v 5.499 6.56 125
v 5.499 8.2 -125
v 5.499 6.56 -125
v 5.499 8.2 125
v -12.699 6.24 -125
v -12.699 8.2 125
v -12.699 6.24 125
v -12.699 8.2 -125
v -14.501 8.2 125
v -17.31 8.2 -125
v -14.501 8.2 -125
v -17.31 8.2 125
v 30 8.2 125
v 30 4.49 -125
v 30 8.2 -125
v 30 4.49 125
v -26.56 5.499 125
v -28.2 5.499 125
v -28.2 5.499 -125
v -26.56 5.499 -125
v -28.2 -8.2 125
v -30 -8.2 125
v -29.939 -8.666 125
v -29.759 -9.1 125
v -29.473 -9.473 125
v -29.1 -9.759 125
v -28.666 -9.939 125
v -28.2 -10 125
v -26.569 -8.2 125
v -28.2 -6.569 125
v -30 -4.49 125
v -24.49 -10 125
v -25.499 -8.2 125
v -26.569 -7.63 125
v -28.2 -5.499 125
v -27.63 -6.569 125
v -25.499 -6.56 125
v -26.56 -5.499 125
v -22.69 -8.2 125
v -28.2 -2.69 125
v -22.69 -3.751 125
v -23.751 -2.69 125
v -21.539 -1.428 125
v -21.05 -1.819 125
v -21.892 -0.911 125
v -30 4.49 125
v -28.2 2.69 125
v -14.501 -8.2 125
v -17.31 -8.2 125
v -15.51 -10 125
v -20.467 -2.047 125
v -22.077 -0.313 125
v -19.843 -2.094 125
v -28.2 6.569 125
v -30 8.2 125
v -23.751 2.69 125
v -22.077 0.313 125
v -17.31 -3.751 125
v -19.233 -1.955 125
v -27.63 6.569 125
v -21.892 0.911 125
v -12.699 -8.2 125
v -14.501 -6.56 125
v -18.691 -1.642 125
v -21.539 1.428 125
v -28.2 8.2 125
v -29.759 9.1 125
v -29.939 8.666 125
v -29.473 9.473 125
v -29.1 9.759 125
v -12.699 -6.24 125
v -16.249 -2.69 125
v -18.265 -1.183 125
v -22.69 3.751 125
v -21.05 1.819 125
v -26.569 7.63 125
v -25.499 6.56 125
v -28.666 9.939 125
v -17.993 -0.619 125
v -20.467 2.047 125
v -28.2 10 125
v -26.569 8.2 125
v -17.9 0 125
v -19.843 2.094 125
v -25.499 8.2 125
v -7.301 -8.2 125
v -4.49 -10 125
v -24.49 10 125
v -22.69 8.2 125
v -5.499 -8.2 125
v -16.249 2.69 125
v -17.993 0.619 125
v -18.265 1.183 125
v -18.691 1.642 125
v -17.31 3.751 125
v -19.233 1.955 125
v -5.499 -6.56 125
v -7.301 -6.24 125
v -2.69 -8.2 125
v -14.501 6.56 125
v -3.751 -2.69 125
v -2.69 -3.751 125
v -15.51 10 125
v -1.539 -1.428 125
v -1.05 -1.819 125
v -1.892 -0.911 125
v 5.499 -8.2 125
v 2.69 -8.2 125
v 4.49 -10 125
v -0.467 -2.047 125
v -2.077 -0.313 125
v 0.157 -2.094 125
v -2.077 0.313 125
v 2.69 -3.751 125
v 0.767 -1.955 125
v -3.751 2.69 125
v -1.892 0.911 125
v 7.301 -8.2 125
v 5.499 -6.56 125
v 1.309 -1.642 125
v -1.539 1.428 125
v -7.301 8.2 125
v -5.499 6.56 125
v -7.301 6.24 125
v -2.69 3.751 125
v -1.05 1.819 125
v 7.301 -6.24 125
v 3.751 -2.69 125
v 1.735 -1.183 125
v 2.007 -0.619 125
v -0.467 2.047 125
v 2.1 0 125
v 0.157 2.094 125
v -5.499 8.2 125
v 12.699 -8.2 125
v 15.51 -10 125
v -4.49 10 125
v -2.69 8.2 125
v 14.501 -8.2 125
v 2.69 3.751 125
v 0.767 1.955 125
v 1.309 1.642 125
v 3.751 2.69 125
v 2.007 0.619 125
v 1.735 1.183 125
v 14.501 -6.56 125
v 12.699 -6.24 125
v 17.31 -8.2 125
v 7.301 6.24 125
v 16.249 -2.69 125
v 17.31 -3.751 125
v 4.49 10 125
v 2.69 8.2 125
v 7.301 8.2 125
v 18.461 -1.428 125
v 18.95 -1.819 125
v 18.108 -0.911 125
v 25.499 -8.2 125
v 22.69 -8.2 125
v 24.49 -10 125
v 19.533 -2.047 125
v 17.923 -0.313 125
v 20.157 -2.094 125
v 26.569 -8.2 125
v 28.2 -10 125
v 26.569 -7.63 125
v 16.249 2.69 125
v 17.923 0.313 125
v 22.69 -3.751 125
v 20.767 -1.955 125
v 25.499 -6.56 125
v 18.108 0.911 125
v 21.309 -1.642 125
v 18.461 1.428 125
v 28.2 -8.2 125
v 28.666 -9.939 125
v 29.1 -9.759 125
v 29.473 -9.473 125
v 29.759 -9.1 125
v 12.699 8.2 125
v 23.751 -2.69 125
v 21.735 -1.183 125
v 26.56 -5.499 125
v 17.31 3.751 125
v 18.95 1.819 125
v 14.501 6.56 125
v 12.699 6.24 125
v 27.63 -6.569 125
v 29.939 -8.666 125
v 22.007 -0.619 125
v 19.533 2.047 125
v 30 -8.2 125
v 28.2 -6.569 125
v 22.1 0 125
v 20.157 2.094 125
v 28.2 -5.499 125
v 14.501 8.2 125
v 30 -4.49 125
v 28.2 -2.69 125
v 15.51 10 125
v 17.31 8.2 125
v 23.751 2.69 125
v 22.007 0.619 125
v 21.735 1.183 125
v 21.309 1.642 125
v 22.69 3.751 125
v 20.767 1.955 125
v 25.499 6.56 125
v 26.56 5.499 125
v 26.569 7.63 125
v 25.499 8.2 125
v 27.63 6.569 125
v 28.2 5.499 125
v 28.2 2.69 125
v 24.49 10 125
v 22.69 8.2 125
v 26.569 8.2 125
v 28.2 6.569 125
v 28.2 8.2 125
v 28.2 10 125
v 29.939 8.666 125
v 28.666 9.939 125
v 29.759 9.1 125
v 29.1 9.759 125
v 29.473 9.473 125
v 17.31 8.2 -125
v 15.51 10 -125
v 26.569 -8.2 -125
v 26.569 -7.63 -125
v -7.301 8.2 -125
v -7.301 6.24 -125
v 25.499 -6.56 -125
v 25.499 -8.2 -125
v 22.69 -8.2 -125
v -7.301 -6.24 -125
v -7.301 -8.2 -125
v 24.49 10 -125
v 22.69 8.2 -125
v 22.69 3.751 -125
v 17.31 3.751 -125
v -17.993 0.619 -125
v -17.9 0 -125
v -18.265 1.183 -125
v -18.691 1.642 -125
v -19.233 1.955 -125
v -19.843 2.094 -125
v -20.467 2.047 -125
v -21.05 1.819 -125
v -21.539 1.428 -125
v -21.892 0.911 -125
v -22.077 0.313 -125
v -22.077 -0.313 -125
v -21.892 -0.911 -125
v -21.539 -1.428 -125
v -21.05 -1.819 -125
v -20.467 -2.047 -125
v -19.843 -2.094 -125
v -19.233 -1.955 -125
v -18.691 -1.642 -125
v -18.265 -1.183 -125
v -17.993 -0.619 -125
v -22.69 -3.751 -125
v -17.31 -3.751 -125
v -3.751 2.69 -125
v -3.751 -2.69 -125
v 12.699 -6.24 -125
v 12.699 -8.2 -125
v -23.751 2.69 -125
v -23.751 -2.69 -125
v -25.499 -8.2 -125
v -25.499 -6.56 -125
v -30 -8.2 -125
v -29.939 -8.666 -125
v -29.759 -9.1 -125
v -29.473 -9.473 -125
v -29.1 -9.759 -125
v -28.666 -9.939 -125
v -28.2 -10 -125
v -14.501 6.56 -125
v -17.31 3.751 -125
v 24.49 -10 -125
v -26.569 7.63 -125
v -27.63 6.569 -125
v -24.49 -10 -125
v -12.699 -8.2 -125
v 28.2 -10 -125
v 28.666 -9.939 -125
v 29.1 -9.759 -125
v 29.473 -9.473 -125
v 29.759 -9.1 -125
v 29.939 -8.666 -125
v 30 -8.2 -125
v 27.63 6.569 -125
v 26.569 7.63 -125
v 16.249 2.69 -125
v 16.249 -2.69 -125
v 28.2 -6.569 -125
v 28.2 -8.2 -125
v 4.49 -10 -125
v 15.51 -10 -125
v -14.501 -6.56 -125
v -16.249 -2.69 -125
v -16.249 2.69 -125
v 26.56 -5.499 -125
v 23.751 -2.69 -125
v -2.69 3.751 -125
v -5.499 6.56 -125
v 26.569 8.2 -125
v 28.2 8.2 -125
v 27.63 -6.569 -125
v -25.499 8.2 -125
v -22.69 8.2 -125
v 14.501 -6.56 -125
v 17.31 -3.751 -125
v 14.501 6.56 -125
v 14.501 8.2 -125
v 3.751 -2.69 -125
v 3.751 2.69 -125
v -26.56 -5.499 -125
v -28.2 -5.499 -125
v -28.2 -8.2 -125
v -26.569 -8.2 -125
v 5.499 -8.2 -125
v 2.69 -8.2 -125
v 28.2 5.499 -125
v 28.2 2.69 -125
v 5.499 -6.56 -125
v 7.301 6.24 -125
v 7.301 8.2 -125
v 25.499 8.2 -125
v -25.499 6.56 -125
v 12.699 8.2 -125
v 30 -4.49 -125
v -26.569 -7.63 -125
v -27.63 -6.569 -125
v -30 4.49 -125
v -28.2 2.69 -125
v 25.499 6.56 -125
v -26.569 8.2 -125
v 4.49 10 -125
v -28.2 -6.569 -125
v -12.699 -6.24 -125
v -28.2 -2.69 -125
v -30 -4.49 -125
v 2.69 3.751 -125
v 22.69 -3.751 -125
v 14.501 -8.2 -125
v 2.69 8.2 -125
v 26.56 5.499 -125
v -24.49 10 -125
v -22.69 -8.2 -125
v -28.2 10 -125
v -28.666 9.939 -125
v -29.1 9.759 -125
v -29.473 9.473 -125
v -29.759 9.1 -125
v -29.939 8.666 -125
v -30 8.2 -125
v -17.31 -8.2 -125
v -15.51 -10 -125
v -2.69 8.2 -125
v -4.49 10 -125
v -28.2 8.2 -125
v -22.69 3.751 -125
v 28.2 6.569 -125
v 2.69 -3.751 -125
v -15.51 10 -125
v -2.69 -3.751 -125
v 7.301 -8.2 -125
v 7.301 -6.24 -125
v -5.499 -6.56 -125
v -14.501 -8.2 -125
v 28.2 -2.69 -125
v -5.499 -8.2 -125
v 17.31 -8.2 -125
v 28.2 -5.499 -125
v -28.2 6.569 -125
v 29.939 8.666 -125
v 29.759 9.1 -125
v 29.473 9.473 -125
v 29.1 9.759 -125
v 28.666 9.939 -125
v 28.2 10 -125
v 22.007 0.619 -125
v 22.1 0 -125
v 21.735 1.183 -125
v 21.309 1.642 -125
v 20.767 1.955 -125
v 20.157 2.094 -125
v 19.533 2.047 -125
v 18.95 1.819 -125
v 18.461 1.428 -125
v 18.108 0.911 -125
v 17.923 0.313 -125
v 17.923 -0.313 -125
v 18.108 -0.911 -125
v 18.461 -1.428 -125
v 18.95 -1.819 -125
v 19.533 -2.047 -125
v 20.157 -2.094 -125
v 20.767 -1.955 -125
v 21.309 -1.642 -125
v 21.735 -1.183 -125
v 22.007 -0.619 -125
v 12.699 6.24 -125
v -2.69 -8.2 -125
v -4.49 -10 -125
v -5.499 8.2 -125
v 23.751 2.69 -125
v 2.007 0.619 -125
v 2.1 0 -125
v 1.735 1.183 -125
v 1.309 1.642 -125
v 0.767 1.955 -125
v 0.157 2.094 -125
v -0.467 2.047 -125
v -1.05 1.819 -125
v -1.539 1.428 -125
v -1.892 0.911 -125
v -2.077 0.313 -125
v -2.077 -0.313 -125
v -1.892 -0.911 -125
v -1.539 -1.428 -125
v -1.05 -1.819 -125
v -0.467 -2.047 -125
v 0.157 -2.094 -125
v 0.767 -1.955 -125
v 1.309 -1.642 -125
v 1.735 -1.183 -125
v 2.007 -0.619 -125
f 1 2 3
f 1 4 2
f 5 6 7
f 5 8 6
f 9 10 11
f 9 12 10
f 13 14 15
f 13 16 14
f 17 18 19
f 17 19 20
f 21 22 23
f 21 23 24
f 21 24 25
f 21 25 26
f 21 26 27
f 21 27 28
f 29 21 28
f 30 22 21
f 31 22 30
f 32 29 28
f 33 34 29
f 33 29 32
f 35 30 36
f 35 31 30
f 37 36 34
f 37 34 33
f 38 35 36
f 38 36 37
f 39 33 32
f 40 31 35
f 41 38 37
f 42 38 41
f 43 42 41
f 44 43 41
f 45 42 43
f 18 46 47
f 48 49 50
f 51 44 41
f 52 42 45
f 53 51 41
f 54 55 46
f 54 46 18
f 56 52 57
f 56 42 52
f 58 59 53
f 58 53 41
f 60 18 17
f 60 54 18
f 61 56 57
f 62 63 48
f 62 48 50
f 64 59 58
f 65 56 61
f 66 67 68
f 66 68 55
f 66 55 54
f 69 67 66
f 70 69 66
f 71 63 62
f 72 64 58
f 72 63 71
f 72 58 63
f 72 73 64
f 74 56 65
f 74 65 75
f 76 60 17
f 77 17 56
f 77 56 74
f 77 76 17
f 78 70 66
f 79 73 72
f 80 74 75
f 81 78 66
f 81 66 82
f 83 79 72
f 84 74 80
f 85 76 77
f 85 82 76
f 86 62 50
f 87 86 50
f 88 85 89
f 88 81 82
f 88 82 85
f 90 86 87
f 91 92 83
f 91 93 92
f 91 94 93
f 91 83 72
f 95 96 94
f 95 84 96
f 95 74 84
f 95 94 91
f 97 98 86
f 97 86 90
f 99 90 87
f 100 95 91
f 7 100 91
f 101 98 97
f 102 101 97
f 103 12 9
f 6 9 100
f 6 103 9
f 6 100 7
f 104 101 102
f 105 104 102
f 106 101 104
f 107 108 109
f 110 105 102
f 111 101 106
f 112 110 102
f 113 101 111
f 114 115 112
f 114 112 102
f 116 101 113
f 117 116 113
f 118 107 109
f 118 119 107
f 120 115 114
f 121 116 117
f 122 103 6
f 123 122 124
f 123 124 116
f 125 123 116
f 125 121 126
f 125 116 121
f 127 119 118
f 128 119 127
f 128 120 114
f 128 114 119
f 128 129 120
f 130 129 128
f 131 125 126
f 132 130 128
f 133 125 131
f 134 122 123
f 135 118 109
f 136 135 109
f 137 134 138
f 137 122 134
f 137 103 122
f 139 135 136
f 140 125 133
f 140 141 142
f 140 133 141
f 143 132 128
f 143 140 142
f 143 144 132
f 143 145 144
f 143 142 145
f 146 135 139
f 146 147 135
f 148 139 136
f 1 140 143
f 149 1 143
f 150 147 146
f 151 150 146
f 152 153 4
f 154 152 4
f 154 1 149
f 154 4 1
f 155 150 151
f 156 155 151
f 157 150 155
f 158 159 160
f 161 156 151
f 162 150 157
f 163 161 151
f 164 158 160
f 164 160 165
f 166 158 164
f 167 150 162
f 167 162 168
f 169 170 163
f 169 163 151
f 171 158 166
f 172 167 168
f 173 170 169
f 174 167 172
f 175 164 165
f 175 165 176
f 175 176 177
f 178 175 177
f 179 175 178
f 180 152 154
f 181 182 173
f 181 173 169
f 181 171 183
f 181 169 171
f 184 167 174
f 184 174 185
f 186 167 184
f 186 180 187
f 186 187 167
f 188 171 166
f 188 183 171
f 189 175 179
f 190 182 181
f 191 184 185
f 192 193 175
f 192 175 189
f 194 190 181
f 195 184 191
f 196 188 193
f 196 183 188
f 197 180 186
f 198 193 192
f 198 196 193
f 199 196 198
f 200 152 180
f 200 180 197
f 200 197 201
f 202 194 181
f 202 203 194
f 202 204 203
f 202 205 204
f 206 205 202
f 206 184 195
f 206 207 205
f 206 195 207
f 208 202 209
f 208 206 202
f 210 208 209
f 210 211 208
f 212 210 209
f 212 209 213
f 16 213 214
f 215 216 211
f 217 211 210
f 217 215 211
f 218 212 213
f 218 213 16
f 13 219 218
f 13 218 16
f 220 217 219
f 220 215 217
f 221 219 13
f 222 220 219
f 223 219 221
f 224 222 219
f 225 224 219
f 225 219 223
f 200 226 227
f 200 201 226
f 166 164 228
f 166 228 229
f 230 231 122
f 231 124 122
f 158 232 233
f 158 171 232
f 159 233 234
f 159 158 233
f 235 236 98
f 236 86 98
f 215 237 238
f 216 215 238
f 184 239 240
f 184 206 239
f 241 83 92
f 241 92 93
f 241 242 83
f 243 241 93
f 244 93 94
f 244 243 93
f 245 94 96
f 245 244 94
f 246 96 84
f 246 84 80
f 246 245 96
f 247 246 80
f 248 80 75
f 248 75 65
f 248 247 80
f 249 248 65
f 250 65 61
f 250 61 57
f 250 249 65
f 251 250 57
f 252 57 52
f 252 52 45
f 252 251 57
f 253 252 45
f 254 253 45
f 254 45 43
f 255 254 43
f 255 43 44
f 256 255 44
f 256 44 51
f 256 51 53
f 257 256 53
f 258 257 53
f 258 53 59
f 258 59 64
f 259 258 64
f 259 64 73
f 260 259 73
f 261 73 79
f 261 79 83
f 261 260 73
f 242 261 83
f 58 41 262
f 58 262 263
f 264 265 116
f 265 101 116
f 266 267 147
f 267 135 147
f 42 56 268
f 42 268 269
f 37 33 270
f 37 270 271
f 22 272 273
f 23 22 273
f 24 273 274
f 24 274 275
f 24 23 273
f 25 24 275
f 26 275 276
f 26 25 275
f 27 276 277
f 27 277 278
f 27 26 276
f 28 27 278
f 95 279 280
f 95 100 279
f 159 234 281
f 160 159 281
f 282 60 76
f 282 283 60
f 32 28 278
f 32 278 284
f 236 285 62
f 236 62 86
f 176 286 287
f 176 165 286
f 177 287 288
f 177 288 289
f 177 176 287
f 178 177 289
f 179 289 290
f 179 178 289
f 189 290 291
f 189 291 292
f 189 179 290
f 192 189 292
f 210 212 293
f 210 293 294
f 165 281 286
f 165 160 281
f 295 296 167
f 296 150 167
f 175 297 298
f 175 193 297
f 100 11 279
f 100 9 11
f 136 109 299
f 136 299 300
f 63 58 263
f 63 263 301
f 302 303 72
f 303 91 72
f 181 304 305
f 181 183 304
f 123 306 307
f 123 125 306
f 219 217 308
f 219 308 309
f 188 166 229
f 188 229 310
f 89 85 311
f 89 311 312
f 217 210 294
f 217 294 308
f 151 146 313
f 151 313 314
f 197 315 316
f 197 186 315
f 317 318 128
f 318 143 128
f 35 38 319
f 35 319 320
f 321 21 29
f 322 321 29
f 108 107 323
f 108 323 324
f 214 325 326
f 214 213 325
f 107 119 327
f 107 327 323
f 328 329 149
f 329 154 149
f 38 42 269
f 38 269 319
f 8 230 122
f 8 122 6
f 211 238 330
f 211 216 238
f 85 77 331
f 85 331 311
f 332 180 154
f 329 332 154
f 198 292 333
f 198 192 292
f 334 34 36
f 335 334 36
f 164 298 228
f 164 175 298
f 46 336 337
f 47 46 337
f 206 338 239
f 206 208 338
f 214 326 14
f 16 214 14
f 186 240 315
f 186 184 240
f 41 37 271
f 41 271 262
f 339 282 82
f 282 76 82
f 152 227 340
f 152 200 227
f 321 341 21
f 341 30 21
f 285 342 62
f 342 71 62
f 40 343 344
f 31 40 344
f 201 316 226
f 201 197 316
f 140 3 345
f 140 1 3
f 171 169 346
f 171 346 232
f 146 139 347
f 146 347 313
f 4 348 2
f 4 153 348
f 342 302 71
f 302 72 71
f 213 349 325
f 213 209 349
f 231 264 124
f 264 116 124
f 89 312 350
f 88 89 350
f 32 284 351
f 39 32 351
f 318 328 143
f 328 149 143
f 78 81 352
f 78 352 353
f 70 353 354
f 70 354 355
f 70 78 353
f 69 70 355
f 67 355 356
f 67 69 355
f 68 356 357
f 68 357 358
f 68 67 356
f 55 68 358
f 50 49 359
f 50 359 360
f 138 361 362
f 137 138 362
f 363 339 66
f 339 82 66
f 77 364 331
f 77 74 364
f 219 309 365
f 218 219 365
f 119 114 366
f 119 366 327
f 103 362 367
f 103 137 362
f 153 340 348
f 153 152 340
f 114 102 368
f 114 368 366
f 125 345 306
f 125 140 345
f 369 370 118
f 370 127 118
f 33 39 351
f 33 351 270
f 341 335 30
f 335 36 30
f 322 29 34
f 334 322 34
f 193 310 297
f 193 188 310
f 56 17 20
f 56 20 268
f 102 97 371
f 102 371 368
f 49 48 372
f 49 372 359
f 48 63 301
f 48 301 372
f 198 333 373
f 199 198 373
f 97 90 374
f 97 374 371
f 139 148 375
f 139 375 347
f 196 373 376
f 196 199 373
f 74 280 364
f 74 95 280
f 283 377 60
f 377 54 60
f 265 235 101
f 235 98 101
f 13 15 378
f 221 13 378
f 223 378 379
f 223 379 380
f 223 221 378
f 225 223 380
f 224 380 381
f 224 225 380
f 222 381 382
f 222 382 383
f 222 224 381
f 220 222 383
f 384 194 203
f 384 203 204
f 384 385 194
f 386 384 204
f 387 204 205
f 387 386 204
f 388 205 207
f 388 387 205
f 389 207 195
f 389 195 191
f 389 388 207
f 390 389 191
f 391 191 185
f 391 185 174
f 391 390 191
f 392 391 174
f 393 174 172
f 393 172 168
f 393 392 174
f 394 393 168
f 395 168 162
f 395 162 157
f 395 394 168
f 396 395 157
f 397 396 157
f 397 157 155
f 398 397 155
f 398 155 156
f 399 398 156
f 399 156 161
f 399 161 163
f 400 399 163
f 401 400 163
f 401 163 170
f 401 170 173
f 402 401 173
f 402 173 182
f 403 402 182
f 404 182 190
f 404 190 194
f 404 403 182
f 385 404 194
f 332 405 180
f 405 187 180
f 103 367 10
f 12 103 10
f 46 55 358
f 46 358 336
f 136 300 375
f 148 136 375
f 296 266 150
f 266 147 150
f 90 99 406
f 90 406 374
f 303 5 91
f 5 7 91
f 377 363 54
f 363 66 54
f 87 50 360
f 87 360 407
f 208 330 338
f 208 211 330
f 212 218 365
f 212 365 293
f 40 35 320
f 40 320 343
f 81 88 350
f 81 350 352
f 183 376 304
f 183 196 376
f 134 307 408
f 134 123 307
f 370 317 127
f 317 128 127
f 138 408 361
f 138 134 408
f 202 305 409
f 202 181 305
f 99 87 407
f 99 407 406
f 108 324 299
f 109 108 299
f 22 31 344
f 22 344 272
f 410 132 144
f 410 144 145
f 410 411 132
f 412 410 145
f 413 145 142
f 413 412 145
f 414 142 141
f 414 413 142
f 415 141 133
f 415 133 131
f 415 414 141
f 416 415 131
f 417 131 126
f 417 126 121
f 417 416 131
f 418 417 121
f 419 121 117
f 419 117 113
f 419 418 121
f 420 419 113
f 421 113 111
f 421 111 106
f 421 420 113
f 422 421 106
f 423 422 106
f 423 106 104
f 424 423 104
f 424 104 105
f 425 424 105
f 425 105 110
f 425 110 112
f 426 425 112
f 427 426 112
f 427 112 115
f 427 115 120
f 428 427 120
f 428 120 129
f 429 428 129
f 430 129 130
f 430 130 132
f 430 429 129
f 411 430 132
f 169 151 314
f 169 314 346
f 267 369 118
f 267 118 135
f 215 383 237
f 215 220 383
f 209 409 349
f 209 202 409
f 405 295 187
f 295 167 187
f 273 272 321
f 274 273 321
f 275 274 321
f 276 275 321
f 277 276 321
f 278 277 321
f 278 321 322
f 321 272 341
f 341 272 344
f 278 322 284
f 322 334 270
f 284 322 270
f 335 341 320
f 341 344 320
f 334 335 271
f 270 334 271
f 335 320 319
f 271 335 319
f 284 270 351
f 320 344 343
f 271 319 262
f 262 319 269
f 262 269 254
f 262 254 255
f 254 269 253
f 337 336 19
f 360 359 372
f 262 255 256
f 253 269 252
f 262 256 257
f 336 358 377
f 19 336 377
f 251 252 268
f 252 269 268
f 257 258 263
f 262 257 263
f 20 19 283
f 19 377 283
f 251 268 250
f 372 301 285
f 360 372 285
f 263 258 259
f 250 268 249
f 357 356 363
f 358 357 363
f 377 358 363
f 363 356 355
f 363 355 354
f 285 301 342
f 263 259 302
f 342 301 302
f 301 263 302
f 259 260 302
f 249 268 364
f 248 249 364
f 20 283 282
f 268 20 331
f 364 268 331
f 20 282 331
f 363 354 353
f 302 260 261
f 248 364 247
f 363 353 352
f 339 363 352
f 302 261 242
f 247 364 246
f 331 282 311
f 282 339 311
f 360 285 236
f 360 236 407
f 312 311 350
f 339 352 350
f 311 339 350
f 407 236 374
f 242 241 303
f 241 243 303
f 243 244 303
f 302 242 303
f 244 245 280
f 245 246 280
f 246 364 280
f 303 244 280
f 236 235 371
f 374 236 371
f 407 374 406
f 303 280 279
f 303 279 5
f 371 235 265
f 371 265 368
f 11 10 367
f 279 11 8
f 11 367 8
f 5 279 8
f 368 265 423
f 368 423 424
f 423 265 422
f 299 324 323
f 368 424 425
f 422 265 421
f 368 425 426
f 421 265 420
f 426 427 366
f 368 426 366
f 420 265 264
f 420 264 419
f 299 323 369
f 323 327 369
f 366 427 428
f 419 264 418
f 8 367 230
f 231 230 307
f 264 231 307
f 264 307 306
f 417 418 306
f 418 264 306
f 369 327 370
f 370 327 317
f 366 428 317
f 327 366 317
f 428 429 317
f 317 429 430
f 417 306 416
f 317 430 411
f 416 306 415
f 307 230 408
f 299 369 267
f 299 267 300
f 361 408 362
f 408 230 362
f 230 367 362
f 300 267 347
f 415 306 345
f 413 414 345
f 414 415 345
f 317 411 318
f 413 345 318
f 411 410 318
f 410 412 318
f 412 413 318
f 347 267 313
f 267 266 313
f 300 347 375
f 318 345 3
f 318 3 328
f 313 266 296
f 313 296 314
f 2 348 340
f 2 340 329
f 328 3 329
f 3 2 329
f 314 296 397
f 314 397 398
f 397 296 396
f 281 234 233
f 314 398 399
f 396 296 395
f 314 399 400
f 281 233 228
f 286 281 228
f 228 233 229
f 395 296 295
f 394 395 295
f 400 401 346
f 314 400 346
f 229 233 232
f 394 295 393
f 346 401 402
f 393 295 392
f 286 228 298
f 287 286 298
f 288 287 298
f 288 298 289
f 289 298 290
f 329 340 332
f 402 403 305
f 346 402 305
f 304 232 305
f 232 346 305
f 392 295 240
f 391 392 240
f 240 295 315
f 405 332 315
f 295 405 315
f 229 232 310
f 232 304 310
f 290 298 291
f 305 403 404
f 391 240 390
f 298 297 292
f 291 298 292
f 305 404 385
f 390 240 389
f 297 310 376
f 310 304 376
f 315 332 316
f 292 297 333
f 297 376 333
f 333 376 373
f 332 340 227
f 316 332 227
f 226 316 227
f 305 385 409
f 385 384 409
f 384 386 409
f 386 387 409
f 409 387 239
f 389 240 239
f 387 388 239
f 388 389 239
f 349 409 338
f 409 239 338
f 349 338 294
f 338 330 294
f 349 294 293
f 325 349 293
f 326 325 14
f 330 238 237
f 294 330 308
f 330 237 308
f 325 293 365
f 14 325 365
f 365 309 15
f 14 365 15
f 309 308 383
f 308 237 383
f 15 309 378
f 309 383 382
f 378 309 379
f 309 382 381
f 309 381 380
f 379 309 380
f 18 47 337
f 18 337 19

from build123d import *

# Parameters (mm, degrees)
ESQUISSE1_R        = 2.1
BOSS_EXTRU_1_DEPTH = 125


with BuildPart() as part:
    # Esquisse1 → Boss.-Extru.1 (new, symmetric)
    with BuildSketch(Plane.XY):
        with BuildLine():
            Line((-20, 3.750660172), (-22.69, 3.750660172))
            Line((-22.69, 3.750660172), (-25.499339828, 6.56))
            Line((-25.499339828, 6.56), (-25.499339828, 8.2))
            Line((-25.499339828, 8.2), (-22.69, 8.2))
            Line((-22.69, 8.2), (-24.49, 10))
            Line((-24.49, 10), (-28.2, 10))
            ThreePointArc((-28.2, 10), (-29.472792206, 9.472792206), (-30, 8.2))
            Line((-30, 8.2), (-30, 4.49))
            Line((-30, 4.49), (-28.2, 2.69))
            Line((-28.2, 2.69), (-28.2, 5.499339828))
            Line((-28.2, 5.499339828), (-26.56, 5.499339828))
            Line((-26.56, 5.499339828), (-23.750660172, 2.69))
            Line((-23.750660172, 2.69), (-23.750660172, 0))
            Line((-23.750660172, 0), (-23.750660172, -2.69))
            Line((-23.750660172, -2.69), (-26.56, -5.499339828))
            Line((-26.56, -5.499339828), (-28.2, -5.499339828))
            Line((-28.2, -5.499339828), (-28.2, -2.69))
            Line((-28.2, -2.69), (-30, -4.49))
            Line((-30, -4.49), (-30, -8.2))
            ThreePointArc((-30, -8.2), (-29.472792206, -9.472792206), (-28.2, -10))
            Line((-28.2, -10), (-24.49, -10))
            Line((-24.49, -10), (-22.69, -8.2))
            Line((-22.69, -8.2), (-25.499339828, -8.2))
            Line((-25.499339828, -8.2), (-25.499339828, -6.56))
            Line((-25.499339828, -6.56), (-22.69, -3.750660172))
            Line((-22.69, -3.750660172), (-20, -3.750660172))
            Line((-20, -3.750660172), (-17.31, -3.750660172))
            Line((-17.31, -3.750660172), (-14.500660172, -6.56))
            Line((-14.500660172, -6.56), (-14.500660172, -8.2))
            Line((-14.500660172, -8.2), (-17.31, -8.2))
            Line((-17.31, -8.2), (-15.51, -10))
            Line((-15.51, -10), (-4.49, -10))
            Line((-4.49, -10), (-2.69, -8.2))
            Line((-2.69, -8.2), (-5.499339828, -8.2))
            Line((-5.499339828, -8.2), (-5.499339828, -6.56))
            Line((-5.499339828, -6.56), (-2.69, -3.750660172))
            Line((-2.69, -3.750660172), (2.69, -3.750660172))
            Line((2.69, -3.750660172), (5.499339828, -6.56))
            Line((5.499339828, -6.56), (5.499339828, -8.2))
            Line((5.499339828, -8.2), (2.69, -8.2))
            Line((2.69, -8.2), (4.49, -10))
            Line((4.49, -10), (15.51, -10))
            Line((15.51, -10), (17.31, -8.2))
            Line((17.31, -8.2), (14.500660172, -8.2))
            Line((14.500660172, -8.2), (14.500660172, -6.56))
            Line((14.500660172, -6.56), (17.31, -3.750660172))
            Line((17.31, -3.750660172), (20, -3.750660172))
            Line((20, -3.750660172), (22.69, -3.750660172))
            Line((22.69, -3.750660172), (25.499339828, -6.56))
            Line((25.499339828, -6.56), (25.499339828, -8.2))
            Line((25.499339828, -8.2), (22.69, -8.2))
            Line((22.69, -8.2), (24.49, -10))
            Line((24.49, -10), (28.2, -10))
            ThreePointArc((28.2, -10), (29.472792206, -9.472792206), (30, -8.2))
            Line((30, -8.2), (30, -4.49))
            Line((30, -4.49), (28.2, -2.69))
            Line((28.2, -2.69), (28.2, -5.499339828))
            Line((28.2, -5.499339828), (26.56, -5.499339828))
            Line((26.56, -5.499339828), (23.750660172, -2.69))
            Line((23.750660172, -2.69), (23.750660172, 0))
            Line((23.750660172, 0), (23.750660172, 2.69))
            Line((23.750660172, 2.69), (26.56, 5.499339828))
            Line((26.56, 5.499339828), (28.2, 5.499339828))
            Line((28.2, 5.499339828), (28.2, 2.69))
            Line((28.2, 2.69), (30, 4.49))
            Line((30, 4.49), (30, 8.2))
            ThreePointArc((30, 8.2), (29.472792206, 9.472792206), (28.2, 10))
            Line((28.2, 10), (24.49, 10))
            Line((24.49, 10), (22.69, 8.2))
            Line((22.69, 8.2), (25.499339828, 8.2))
            Line((25.499339828, 8.2), (25.499339828, 6.56))
            Line((25.499339828, 6.56), (22.69, 3.750660172))
            Line((22.69, 3.750660172), (20, 3.750660172))
            Line((20, 3.750660172), (17.31, 3.750660172))
            Line((17.31, 3.750660172), (14.500660172, 6.56))
            Line((14.500660172, 6.56), (14.500660172, 8.2))
            Line((14.500660172, 8.2), (17.31, 8.2))
            Line((17.31, 8.2), (15.51, 10))
            Line((15.51, 10), (4.49, 10))
            Line((4.49, 10), (2.69, 8.2))
            Line((2.69, 8.2), (5.499339828, 8.2))
            Line((5.499339828, 8.2), (5.499339828, 6.56))
            Line((5.499339828, 6.56), (2.69, 3.750660172))
            Line((2.69, 3.750660172), (-2.69, 3.750660172))
            Line((-2.69, 3.750660172), (-5.499339828, 6.56))
            Line((-5.499339828, 6.56), (-5.499339828, 8.2))
            Line((-5.499339828, 8.2), (-2.69, 8.2))
            Line((-2.69, 8.2), (-4.49, 10))
            Line((-4.49, 10), (-15.51, 10))
            Line((-15.51, 10), (-17.31, 8.2))
            Line((-17.31, 8.2), (-14.500660172, 8.2))
            Line((-14.500660172, 8.2), (-14.500660172, 6.56))
            Line((-14.500660172, 6.56), (-17.31, 3.750660172))
            Line((-17.31, 3.750660172), (-20, 3.750660172))
        make_face()
        Circle(ESQUISSE1_R, mode=Mode.SUBTRACT)
        with Locations((-20, 0)):
            Circle(ESQUISSE1_R, mode=Mode.SUBTRACT)
        with Locations((20, 0)):
            Circle(ESQUISSE1_R, mode=Mode.SUBTRACT)
        Polygon((-28.2, 8.2), (-28.2, 6.569339828), (-27.63, 6.569339828), (-26.569339828, 7.63), (-26.569339828, 8.2), align=None, mode=Mode.SUBTRACT)
        Polygon((-26.569339828, -7.63), (-27.63, -6.569339828), (-28.2, -6.569339828), (-28.2, -8.2), (-26.569339828, -8.2), align=None, mode=Mode.SUBTRACT)
        Polygon((-7.300660172, -8.2), (-7.300660172, -6.24), (-3.750660172, -2.69), (-3.750660172, 2.69), (-7.300660172, 6.24), (-7.300660172, 8.2), (-12.699339828, 8.2), (-12.699339828, 6.24), (-16.249339828, 2.69), (-16.249339828, -2.69), (-12.699339828, -6.24), (-12.699339828, -8.2), align=None, mode=Mode.SUBTRACT)
        Polygon((26.569339828, 8.2), (28.2, 8.2), (28.2, 6.569339828), (27.63, 6.569339828), (26.569339828, 7.63), align=None, mode=Mode.SUBTRACT)
        Polygon((26.569339828, -8.2), (26.569339828, -7.63), (27.63, -6.569339828), (28.2, -6.569339828), (28.2, -8.2), align=None, mode=Mode.SUBTRACT)
        Polygon((7.300660172, 8.2), (7.300660172, 6.24), (3.750660172, 2.69), (3.750660172, -2.69), (7.300660172, -6.24), (7.300660172, -8.2), (12.699339828, -8.2), (12.699339828, -6.24), (16.249339828, -2.69), (16.249339828, 2.69), (12.699339828, 6.24), (12.699339828, 8.2), align=None, mode=Mode.SUBTRACT)
    extrude(amount=BOSS_EXTRU_1_DEPTH, both=True)


solid = part.part
